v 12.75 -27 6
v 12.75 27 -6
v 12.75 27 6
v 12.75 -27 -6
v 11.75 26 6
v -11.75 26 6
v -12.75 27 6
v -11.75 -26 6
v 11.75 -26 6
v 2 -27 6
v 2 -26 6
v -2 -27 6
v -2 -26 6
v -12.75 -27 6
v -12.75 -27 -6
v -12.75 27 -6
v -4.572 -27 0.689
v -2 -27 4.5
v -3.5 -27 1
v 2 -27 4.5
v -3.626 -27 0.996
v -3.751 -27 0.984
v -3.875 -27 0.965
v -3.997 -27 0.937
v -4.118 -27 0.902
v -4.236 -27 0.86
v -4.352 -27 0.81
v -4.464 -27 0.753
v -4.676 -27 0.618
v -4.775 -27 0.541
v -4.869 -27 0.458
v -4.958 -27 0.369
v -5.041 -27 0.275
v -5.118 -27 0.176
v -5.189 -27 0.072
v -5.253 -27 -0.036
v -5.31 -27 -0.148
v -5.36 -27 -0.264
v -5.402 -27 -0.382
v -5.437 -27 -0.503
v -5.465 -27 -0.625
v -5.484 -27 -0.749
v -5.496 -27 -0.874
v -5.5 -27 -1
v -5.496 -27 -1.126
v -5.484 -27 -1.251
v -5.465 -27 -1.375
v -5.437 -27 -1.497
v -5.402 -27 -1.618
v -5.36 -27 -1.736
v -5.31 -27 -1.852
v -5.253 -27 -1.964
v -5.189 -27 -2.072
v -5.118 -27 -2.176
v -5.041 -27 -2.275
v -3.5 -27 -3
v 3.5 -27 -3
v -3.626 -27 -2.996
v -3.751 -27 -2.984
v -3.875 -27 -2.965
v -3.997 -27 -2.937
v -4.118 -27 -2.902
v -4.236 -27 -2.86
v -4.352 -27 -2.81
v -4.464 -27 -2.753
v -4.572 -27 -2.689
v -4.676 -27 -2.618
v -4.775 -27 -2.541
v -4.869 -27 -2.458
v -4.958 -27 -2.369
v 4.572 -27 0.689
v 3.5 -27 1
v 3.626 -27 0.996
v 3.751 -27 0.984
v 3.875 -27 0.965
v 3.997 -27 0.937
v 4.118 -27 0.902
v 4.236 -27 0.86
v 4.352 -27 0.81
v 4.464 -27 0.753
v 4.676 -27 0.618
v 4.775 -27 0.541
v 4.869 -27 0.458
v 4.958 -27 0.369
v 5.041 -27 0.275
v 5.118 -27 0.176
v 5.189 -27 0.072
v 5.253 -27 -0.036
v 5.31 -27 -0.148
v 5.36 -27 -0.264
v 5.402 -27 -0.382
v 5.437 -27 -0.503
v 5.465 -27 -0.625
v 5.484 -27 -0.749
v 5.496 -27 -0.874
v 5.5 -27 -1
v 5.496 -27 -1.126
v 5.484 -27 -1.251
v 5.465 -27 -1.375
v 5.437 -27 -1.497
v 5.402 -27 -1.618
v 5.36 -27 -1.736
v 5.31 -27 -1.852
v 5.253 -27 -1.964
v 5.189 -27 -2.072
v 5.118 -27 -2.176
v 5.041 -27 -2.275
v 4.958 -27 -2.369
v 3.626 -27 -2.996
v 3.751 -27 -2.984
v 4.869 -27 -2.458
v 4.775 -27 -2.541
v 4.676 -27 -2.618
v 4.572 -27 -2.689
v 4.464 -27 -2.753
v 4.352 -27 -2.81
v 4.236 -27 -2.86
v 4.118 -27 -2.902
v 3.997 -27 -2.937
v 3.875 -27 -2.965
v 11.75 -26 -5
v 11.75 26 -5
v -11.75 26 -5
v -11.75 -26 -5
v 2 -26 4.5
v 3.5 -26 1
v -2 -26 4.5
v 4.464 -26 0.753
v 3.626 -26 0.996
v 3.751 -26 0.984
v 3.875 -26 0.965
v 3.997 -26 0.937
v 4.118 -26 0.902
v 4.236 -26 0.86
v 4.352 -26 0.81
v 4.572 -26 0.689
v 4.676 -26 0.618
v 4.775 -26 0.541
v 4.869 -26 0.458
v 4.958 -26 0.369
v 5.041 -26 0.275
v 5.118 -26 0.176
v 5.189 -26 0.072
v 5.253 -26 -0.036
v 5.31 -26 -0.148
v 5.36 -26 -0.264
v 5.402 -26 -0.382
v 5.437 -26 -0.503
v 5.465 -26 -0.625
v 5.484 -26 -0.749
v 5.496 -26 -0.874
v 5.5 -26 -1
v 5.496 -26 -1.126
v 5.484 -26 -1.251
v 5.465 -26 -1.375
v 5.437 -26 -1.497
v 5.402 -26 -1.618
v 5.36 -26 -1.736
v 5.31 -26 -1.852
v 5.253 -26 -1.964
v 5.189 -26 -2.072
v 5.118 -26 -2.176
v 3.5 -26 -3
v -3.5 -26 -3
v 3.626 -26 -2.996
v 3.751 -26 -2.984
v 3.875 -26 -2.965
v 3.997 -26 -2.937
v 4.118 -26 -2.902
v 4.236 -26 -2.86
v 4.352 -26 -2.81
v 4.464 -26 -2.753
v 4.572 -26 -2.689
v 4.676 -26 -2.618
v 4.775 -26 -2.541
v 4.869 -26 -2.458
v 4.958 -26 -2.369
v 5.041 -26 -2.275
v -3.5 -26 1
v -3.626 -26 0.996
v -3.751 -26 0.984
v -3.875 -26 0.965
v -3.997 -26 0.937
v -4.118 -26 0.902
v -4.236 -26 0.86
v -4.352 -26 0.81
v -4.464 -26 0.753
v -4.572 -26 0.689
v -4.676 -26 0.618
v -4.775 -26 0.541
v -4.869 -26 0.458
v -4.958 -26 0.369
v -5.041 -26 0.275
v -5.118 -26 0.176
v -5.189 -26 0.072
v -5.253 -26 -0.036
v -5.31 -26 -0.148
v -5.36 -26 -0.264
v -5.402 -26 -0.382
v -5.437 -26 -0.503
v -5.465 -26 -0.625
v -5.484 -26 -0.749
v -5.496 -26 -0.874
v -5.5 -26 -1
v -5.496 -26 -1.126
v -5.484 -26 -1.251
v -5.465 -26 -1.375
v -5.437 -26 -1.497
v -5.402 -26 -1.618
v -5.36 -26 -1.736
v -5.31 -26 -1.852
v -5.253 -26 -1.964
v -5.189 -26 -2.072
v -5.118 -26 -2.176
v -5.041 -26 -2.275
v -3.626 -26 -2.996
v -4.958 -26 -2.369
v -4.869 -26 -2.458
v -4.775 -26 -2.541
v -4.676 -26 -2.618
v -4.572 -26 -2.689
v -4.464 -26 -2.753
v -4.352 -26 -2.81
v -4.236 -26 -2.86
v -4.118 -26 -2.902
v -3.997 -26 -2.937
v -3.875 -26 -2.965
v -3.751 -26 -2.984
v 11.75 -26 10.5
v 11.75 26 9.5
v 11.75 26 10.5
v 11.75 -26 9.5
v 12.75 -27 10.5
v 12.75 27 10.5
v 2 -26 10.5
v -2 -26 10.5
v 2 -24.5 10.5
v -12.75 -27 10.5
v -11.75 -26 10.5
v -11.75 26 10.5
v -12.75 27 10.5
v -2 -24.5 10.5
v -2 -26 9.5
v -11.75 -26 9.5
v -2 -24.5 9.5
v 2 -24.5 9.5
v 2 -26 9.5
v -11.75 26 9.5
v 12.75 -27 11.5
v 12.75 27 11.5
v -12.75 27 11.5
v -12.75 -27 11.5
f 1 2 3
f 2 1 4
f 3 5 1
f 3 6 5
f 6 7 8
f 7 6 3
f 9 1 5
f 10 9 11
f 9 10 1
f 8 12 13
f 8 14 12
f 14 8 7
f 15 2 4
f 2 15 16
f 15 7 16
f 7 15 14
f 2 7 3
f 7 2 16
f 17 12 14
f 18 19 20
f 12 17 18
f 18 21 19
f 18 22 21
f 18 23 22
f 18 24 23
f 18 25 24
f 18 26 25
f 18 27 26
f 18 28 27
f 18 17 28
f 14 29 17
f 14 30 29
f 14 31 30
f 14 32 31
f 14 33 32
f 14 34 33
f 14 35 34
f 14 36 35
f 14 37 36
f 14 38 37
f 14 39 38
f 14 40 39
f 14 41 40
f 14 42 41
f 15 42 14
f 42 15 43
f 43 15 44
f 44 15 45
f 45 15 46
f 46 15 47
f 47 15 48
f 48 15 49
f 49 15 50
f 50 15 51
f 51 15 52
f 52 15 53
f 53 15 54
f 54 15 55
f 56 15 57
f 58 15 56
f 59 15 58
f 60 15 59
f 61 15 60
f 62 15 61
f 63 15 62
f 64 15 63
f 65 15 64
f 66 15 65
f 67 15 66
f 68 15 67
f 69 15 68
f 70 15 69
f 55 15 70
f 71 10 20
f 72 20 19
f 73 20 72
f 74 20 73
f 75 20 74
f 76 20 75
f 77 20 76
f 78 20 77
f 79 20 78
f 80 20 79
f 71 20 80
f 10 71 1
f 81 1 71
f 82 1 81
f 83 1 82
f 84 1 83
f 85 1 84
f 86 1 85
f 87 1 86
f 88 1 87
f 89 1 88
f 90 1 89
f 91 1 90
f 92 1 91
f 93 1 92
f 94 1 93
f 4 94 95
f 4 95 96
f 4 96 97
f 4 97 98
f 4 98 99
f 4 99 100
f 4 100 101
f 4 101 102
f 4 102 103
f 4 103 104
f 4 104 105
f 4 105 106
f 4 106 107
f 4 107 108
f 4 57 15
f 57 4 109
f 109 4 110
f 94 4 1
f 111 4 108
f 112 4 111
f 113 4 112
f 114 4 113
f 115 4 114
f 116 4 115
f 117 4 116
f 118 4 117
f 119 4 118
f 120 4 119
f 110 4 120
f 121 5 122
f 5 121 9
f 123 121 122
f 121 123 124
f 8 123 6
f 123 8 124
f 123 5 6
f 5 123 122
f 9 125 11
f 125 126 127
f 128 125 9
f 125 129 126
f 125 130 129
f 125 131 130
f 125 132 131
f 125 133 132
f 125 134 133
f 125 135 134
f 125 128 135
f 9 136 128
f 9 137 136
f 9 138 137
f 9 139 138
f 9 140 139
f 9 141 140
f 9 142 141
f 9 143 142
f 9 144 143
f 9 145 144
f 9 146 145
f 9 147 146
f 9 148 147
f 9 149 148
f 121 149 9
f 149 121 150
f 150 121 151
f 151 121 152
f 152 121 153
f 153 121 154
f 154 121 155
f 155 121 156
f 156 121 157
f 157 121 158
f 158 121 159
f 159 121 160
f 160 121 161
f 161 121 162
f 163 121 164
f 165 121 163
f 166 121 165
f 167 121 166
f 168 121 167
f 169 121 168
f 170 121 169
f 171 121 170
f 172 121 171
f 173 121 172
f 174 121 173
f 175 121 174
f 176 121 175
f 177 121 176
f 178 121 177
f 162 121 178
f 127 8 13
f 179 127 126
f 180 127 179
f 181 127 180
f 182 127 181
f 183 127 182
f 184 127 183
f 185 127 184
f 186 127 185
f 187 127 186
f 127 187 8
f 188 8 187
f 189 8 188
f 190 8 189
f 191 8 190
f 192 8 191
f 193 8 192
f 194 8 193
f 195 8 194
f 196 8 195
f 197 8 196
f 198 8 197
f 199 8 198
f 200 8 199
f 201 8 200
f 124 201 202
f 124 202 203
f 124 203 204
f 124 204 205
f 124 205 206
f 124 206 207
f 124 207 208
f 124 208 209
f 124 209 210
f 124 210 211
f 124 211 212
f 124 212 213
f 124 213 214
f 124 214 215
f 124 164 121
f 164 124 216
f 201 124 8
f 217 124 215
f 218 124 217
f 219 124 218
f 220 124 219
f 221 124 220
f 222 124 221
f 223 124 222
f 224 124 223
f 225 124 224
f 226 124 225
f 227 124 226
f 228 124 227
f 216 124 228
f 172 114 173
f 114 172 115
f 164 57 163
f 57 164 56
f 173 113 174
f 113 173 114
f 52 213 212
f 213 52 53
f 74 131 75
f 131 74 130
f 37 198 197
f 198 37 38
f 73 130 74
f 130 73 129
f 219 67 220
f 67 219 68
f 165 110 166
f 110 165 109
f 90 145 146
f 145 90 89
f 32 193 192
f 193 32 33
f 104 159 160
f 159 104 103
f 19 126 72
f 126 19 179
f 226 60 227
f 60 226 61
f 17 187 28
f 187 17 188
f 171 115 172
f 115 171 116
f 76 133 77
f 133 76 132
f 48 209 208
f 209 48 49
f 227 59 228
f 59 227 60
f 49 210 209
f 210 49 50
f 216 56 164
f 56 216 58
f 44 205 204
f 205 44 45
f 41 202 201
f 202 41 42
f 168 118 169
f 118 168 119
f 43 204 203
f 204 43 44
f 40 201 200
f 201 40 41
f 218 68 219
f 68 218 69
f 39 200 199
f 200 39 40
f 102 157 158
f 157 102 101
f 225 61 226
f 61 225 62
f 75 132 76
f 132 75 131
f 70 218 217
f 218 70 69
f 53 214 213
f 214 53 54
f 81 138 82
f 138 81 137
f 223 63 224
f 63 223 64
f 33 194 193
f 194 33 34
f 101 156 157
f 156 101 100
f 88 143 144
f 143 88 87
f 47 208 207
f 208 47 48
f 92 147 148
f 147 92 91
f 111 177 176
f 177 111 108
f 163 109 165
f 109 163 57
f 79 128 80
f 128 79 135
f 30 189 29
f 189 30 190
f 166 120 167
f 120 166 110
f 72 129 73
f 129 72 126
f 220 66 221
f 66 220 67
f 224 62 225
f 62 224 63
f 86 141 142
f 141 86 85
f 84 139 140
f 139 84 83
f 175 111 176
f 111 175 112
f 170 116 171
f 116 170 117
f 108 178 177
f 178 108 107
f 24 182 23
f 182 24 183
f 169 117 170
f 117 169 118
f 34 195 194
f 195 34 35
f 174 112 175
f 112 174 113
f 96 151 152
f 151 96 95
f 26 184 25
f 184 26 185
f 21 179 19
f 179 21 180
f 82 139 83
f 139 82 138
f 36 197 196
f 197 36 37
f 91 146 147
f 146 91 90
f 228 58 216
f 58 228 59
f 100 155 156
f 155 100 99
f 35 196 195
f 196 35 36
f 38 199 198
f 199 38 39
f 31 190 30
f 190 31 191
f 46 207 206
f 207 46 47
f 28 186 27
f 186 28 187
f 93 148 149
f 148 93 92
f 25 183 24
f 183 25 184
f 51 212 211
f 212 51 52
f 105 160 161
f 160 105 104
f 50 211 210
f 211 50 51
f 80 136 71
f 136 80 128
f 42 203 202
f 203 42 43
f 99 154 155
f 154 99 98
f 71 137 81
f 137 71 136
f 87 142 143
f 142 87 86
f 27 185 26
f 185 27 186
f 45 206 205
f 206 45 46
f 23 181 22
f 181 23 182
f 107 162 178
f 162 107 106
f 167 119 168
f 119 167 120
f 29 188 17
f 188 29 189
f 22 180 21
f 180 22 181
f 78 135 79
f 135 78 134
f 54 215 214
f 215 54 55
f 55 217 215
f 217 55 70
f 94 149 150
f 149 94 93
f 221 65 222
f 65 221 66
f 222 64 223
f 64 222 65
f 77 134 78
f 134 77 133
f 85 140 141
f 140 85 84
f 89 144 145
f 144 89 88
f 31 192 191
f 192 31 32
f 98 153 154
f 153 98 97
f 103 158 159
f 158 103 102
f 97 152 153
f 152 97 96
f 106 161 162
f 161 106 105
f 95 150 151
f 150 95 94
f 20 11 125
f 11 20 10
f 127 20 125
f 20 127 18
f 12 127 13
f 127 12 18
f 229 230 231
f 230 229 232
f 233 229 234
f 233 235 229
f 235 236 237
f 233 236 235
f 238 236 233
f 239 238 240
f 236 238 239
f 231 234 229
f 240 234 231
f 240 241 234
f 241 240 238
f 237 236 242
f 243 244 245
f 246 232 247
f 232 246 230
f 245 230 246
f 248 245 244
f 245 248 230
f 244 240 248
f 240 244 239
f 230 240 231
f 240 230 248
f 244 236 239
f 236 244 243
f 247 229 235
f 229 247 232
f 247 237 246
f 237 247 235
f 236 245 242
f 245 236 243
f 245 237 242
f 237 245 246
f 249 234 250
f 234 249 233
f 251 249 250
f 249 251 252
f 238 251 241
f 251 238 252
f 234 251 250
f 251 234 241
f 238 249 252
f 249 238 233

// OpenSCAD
width = 23.5;
height = 11;
length = 52;
usbWidth = 10;
usbHeight = 4;
thickness = 1;
$fn = 100;

module base() {
    difference() {
        cube([width + thickness*2, length + thickness*2, height + thickness], true);
        
        translate([0, 0, thickness * 1.5])
        cube([width, length, height + thickness * 2], true);
        
        translate([0, -length / 2 + thickness / 2, - height / 2 + 4.5])
        rotate([90, 0, 0])
        hull() {
            translate([-usbWidth * 0.35, 0, 0])
            cylinder(thickness * 2, usbHeight / 2, usbHeight / 2);
            
            translate([usbWidth * 0.35, 0, 0])
            cylinder(thickness * 2, usbHeight / 2, usbHeight / 2);
        }
        
        translate([0, -length / 2 - thickness / 2, height / 2])
        cube([4, thickness * 2, 2], true);
    }
}

module top() {
    cube([width + thickness*2, length + thickness*2, thickness], true);
    
    difference() {
        translate([0, 0, -thickness / 2 - 1 / 2])
        cube([width, length, 1], true);
        
        translate([0, -length / 2 + thickness / 2, -thickness / 2 - 1 / 2])
        cube([4, thickness * 2, 1.001], true);
    }
}

base();

translate([0, 0, height])
top();
